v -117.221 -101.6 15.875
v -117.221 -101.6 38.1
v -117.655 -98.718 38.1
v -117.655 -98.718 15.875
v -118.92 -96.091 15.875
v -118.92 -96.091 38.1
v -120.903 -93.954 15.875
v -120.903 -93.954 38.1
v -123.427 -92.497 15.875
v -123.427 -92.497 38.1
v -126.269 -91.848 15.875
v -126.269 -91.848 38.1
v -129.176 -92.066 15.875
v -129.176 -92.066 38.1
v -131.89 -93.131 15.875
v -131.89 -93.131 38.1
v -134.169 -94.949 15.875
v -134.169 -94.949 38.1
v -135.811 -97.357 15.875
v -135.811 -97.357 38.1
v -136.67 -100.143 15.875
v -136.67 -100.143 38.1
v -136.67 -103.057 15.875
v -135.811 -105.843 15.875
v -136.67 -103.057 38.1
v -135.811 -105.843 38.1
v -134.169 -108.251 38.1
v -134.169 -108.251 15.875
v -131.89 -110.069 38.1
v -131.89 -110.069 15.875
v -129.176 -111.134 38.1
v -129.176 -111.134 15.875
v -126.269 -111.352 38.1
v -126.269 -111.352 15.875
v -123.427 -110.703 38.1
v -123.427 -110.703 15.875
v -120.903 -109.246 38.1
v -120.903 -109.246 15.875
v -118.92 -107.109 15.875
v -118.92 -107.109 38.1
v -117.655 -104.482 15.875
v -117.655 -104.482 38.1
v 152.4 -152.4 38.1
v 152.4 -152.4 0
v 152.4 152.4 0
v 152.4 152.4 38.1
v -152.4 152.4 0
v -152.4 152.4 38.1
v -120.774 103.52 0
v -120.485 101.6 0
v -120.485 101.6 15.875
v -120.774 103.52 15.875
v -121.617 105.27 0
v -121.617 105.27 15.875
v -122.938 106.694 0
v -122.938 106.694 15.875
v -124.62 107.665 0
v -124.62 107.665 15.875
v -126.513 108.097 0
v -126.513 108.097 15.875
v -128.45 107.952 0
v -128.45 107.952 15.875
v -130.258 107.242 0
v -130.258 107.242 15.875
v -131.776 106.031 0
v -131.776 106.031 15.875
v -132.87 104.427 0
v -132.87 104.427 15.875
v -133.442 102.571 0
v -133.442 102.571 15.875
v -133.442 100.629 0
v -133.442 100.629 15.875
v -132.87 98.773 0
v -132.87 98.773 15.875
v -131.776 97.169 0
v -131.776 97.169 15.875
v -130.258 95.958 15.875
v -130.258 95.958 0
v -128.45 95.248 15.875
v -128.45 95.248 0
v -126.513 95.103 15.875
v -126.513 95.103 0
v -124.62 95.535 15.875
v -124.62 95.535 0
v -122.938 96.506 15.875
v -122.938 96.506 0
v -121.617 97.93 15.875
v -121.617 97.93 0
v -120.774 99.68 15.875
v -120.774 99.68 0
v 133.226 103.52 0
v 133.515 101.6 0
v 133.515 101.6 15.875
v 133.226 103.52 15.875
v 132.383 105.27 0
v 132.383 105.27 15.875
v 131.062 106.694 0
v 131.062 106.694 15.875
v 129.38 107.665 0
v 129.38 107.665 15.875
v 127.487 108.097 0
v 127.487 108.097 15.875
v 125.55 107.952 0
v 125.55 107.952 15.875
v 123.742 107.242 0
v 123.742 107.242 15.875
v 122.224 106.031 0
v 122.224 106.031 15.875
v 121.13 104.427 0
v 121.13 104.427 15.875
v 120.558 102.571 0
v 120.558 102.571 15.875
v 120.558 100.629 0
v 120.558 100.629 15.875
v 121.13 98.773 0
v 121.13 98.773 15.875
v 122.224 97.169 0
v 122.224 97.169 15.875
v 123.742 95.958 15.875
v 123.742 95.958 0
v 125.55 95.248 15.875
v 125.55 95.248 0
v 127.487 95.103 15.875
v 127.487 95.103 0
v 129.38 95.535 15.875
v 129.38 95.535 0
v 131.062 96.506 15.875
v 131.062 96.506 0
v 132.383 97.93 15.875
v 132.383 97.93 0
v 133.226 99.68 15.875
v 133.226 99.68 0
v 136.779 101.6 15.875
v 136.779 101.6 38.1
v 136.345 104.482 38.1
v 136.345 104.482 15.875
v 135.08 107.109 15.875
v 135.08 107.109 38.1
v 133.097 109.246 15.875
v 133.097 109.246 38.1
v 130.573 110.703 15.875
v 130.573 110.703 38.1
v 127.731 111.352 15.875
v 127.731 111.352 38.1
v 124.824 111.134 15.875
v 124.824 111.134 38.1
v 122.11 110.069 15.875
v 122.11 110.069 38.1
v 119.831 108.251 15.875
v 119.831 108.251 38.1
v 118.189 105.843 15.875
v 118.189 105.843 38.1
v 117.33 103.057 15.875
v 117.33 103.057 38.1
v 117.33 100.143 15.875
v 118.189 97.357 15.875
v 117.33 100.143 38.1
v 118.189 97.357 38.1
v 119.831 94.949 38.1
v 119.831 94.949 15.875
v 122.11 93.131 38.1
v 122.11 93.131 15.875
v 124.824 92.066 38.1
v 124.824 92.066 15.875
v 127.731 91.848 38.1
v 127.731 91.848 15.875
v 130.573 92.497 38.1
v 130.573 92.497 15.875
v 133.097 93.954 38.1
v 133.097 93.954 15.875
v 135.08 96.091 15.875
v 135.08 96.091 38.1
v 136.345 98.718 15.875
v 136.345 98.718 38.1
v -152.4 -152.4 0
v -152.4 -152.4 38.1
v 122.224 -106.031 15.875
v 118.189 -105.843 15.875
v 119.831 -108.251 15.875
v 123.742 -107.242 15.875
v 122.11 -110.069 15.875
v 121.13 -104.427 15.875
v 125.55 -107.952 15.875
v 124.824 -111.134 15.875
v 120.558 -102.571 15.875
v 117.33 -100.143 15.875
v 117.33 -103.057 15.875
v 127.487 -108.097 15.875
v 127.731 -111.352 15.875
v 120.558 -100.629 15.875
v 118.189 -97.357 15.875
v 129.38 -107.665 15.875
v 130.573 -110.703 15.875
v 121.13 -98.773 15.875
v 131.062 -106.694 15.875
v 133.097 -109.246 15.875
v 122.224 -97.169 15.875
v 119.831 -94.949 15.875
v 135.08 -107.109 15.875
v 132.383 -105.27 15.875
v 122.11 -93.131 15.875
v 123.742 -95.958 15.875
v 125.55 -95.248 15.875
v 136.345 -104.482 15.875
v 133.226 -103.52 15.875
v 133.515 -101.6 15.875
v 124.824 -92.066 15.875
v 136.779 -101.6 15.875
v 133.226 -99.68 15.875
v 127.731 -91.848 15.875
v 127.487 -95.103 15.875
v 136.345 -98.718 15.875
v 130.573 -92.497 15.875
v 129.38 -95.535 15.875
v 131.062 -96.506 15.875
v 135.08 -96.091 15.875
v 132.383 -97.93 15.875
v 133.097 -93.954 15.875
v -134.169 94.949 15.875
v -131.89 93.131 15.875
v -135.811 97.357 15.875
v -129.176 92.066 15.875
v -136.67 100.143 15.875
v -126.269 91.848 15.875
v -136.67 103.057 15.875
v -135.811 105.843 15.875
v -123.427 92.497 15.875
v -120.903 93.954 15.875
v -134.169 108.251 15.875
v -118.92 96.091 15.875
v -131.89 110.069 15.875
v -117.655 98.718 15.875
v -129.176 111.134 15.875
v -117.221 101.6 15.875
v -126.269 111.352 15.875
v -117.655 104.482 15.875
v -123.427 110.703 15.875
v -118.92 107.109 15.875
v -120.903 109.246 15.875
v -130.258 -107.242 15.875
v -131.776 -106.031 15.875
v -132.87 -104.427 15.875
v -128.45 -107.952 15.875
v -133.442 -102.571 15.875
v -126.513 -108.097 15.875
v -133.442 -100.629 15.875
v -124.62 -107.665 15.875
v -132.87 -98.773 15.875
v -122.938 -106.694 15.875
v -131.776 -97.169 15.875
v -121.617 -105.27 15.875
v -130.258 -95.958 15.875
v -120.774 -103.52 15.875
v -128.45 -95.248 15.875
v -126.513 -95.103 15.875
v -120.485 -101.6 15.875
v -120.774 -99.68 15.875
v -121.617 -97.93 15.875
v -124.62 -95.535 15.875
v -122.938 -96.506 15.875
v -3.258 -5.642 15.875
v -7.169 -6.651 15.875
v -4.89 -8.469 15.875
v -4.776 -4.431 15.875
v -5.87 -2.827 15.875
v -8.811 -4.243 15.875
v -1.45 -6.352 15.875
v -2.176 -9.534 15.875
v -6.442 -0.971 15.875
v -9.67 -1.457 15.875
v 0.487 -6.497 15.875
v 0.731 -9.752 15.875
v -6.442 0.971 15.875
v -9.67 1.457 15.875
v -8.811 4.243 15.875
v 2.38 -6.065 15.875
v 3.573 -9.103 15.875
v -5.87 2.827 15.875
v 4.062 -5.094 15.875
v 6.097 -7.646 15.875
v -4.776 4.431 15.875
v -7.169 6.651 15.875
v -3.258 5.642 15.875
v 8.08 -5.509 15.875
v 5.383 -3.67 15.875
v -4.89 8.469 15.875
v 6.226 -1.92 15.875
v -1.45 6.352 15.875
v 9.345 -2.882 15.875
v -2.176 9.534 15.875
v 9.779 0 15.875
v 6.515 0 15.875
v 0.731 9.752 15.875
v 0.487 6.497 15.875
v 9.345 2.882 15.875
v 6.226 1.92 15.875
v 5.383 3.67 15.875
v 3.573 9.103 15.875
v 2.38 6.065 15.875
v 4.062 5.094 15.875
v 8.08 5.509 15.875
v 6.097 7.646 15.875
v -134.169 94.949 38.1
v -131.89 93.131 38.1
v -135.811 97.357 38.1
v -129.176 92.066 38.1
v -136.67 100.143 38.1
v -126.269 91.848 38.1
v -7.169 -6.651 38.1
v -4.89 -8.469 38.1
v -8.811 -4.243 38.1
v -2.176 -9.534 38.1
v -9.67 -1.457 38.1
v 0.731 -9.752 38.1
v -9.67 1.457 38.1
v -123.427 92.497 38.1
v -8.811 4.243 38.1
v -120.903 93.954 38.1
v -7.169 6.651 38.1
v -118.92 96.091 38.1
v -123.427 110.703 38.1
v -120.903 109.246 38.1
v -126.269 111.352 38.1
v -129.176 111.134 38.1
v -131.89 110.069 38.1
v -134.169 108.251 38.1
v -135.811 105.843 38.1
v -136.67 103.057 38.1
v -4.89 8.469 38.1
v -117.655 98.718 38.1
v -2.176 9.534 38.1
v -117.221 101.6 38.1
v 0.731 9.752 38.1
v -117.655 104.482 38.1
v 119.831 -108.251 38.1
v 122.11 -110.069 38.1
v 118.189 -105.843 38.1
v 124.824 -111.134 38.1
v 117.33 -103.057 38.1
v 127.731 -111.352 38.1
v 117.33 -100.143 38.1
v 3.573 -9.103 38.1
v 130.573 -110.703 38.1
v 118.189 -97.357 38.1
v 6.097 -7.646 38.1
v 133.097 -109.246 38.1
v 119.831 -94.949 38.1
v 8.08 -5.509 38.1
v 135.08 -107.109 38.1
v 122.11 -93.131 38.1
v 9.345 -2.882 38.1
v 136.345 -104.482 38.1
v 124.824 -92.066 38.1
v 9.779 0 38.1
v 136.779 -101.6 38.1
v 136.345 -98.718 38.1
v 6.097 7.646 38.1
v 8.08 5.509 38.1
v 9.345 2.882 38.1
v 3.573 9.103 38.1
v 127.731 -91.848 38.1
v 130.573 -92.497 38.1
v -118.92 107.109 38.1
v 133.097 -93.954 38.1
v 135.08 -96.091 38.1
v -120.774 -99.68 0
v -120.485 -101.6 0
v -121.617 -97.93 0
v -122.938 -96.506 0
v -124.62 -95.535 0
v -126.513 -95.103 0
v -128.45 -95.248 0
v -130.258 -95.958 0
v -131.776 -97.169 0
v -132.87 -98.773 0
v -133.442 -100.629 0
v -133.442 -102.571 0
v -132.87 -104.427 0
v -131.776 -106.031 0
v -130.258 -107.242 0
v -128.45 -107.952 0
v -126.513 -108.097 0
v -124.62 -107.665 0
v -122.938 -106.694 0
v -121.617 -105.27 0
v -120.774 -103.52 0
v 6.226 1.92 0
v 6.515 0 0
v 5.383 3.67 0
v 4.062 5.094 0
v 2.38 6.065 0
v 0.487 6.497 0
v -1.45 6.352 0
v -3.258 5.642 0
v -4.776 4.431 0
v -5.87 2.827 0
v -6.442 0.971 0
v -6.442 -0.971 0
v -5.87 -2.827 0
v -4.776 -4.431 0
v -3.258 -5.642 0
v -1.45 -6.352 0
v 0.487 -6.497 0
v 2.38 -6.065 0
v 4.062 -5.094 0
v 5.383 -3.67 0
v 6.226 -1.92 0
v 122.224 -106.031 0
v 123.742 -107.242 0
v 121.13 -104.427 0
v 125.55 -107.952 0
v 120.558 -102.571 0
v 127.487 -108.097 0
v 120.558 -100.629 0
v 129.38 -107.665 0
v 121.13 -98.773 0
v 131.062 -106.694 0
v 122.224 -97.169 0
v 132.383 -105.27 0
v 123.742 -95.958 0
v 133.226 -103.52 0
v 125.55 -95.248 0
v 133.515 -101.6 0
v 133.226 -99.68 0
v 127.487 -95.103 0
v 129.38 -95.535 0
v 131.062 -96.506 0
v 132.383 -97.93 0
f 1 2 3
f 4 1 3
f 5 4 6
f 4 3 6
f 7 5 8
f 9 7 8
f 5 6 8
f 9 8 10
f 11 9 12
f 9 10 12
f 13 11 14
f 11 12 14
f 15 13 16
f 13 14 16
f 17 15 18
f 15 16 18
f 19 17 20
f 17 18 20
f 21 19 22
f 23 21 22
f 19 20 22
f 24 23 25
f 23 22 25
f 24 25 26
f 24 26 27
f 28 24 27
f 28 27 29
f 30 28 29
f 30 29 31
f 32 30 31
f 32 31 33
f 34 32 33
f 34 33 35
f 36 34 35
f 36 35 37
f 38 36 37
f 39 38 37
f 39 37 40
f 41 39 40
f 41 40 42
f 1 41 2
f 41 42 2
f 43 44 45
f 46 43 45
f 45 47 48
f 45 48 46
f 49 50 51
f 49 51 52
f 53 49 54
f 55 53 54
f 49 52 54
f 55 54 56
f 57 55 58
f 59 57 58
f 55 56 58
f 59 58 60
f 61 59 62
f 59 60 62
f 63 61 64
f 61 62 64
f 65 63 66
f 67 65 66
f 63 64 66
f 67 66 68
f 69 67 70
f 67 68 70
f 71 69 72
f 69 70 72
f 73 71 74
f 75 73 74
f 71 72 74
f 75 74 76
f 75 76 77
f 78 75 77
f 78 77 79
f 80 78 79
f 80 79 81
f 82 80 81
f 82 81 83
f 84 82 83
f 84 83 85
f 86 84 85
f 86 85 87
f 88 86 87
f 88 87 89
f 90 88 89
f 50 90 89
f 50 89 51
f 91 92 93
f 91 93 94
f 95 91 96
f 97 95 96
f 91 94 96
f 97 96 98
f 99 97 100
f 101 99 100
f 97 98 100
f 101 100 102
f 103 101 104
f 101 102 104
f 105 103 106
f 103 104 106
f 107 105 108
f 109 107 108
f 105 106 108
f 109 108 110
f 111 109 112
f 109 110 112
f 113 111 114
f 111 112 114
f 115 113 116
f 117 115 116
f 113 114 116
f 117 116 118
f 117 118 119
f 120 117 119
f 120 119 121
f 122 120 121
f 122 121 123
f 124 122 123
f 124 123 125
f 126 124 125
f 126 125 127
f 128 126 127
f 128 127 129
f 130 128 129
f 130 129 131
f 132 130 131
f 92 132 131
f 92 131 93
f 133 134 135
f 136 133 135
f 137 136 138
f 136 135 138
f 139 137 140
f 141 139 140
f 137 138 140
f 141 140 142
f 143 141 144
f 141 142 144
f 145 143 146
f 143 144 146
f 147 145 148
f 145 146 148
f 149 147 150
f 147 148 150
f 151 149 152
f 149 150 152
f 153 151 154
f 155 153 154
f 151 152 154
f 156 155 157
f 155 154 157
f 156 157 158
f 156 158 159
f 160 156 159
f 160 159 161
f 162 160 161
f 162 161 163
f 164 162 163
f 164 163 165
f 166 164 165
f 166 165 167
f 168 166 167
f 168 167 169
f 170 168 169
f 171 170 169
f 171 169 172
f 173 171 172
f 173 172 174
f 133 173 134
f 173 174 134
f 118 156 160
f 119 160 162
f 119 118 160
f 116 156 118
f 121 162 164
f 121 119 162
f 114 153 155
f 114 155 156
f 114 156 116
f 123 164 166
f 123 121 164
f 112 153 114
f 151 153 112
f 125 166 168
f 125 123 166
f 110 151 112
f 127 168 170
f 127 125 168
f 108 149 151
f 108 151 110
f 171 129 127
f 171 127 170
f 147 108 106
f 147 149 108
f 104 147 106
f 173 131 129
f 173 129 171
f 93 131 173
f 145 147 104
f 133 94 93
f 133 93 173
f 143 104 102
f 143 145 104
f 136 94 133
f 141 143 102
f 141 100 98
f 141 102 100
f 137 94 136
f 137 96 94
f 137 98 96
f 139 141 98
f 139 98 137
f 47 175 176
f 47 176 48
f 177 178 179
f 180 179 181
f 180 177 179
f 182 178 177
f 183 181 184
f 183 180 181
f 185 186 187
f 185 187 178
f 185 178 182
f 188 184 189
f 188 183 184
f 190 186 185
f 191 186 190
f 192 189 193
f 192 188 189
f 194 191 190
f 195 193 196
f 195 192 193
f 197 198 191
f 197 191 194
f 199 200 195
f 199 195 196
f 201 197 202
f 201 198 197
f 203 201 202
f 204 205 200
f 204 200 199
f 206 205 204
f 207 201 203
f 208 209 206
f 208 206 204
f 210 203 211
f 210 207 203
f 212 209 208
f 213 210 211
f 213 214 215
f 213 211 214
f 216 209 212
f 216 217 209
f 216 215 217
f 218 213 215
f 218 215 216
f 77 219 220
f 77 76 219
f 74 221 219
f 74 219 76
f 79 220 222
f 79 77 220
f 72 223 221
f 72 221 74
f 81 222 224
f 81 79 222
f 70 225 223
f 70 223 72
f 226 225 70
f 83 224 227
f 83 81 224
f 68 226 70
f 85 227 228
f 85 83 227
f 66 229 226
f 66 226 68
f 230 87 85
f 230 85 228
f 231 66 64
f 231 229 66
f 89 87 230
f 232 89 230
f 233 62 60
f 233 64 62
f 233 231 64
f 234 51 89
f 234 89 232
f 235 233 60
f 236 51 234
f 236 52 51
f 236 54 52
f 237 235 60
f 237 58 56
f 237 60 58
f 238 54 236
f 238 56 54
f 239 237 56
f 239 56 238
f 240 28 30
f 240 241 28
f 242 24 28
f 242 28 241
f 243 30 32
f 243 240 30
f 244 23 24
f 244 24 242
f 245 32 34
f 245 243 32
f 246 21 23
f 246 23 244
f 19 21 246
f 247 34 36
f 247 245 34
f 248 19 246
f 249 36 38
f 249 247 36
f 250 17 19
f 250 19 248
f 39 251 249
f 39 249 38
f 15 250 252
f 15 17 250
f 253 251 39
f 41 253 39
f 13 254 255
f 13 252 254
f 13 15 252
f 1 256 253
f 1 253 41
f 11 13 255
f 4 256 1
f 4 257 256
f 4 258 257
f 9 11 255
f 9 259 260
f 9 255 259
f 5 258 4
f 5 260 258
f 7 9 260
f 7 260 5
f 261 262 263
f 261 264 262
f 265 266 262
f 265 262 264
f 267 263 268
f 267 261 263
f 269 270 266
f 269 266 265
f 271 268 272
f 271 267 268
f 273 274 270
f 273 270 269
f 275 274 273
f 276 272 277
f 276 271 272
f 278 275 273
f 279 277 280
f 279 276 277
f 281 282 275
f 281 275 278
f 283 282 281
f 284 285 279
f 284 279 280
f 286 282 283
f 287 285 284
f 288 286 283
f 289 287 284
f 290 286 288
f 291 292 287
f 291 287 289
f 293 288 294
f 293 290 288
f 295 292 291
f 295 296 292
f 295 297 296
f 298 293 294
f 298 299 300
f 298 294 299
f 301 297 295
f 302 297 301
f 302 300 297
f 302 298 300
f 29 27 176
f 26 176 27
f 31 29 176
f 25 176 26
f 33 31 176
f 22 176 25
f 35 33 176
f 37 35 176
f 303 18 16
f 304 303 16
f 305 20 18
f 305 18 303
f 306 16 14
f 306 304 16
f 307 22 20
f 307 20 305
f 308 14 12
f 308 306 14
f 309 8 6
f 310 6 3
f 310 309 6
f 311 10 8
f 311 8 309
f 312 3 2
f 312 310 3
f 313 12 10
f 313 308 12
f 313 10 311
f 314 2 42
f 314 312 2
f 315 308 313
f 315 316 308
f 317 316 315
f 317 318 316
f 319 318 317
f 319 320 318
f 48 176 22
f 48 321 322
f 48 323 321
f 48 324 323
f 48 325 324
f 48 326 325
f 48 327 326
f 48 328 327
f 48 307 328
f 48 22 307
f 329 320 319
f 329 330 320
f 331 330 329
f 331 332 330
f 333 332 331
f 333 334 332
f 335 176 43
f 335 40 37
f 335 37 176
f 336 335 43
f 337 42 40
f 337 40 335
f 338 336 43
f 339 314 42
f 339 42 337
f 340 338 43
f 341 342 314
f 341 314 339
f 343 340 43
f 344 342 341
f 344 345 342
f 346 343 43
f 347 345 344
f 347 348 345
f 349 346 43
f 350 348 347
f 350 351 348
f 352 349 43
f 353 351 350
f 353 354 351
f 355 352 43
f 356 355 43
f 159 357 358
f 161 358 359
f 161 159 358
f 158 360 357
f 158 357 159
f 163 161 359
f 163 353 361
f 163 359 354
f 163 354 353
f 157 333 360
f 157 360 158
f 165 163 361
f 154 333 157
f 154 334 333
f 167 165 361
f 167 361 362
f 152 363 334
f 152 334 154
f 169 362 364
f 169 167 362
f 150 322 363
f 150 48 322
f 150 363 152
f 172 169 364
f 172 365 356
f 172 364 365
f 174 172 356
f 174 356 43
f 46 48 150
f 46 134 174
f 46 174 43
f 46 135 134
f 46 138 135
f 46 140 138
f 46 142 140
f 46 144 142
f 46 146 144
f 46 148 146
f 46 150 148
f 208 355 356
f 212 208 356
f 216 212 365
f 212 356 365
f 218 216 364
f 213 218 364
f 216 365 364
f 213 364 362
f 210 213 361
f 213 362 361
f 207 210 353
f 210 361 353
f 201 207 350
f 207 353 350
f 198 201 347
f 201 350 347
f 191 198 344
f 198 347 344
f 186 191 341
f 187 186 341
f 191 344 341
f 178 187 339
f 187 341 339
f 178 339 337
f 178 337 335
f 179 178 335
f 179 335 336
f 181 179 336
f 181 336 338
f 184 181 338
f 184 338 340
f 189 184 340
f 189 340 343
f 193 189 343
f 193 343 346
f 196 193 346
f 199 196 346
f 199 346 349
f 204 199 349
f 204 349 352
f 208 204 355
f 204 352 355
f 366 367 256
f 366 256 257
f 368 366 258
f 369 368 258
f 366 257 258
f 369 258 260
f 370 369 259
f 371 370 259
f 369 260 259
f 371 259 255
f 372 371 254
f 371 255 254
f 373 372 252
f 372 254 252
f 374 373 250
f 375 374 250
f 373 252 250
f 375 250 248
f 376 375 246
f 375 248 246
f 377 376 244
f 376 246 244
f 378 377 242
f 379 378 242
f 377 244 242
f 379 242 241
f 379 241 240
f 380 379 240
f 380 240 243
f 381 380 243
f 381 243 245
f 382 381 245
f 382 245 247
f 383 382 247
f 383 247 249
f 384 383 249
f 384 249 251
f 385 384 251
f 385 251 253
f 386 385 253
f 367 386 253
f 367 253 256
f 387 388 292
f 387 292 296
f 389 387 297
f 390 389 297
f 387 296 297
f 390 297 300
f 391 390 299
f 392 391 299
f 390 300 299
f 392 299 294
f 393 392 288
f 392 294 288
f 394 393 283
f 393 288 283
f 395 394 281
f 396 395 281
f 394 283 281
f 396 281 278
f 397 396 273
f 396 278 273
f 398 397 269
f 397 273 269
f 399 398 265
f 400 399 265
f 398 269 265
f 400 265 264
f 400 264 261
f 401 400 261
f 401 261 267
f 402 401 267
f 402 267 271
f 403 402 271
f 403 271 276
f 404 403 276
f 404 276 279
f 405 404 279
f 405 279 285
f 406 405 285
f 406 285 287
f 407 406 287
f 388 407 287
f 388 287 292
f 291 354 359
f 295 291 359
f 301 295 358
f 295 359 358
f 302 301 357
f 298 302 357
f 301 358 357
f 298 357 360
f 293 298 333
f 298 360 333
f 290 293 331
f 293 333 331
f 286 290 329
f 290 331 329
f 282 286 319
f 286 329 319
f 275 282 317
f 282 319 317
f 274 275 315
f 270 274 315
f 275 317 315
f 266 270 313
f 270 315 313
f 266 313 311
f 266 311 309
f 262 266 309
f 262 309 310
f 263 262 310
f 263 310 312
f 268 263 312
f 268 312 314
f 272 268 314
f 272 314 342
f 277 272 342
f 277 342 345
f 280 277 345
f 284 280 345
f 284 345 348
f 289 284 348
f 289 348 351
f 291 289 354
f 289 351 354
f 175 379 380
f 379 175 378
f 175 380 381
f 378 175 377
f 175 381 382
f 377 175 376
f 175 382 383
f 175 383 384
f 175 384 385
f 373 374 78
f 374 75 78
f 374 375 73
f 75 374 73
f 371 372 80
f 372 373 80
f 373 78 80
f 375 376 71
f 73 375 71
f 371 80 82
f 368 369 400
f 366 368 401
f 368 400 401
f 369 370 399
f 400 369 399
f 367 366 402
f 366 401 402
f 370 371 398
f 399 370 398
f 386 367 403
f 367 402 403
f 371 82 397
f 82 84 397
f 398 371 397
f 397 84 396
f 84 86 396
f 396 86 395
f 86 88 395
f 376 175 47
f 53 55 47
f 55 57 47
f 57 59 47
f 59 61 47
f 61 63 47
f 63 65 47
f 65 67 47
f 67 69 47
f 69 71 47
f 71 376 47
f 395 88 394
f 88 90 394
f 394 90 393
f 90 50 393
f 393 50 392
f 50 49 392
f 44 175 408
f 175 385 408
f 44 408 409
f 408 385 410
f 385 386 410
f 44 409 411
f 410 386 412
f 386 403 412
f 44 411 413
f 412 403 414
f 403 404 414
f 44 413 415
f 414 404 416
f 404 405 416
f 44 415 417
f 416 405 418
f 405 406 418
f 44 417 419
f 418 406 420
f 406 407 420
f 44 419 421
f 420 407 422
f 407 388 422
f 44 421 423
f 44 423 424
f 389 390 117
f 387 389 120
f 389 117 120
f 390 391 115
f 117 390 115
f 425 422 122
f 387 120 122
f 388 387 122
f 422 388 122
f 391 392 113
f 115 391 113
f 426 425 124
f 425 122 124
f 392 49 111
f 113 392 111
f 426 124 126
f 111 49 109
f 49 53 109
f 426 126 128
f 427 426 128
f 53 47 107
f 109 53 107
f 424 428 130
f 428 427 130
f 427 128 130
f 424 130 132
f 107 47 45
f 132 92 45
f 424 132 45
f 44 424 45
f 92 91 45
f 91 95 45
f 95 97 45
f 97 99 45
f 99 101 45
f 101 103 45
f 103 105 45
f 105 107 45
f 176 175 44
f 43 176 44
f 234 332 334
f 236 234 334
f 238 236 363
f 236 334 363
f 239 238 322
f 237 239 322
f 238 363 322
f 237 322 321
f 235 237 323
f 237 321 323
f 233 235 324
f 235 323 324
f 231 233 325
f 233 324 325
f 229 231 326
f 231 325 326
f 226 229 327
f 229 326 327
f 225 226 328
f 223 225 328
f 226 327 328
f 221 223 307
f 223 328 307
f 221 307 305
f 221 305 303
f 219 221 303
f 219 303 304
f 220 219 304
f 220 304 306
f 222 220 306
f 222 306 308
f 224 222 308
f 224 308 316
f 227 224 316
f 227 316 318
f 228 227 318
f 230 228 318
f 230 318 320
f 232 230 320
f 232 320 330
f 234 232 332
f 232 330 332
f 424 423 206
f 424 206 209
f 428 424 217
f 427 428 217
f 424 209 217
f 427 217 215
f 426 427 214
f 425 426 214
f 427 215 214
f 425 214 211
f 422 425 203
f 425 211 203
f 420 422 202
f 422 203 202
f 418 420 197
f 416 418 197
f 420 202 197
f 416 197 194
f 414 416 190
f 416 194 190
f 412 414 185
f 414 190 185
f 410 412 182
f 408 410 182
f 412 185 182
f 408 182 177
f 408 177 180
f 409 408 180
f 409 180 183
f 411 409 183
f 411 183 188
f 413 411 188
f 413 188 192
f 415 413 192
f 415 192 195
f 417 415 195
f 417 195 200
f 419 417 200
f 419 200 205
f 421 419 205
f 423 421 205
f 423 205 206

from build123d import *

# Parameters (mm, degrees)
SKETCH1_W                = 304.8
SKETCH1_H                = 304.8
BOSS_EXTRUDE1_DEPTH      = 38.1
SKETCH2_R                = 6.5151
HAAS_T_SLOT_HOLES_DEPTH  = 219.867836833
SKETCH3_R                = 9.779
HAAS_COUNTER_BORES_DEPTH = 22.225


with BuildPart() as part:
    # Sketch1 → Boss-Extrude1 (new body)
    with BuildSketch(Plane.XY):
        Rectangle(SKETCH1_W, SKETCH1_H)
    extrude(amount=BOSS_EXTRUDE1_DEPTH)

    # Sketch2 → HAAS T-Slot Holes (cut, through all)
    with BuildSketch(Plane.XY.offset(38.1)):
        with Locations((-127, 101.6)):
            Circle(SKETCH2_R)
        with Locations((127, 101.6)):
            Circle(SKETCH2_R)
        with Locations((127, -101.6)):
            Circle(SKETCH2_R)
        with Locations((-127, -101.6)):
            Circle(SKETCH2_R)
        Circle(SKETCH2_R)
    extrude(amount=-HAAS_T_SLOT_HOLES_DEPTH, mode=Mode.SUBTRACT)

    # Sketch3 → HAAS Counter Bores (cut)
    with BuildSketch(Plane.XY.offset(38.1)):
        with Locations((-127, 101.6)):
            Circle(SKETCH3_R)
        with Locations((127, 101.6)):
            Circle(SKETCH3_R)
        Circle(SKETCH3_R)
        with Locations((127, -101.6)):
            Circle(SKETCH3_R)
        with Locations((-127, -101.6)):
            Circle(SKETCH3_R)
    extrude(amount=-HAAS_COUNTER_BORES_DEPTH, mode=Mode.SUBTRACT)


solid = part.part
